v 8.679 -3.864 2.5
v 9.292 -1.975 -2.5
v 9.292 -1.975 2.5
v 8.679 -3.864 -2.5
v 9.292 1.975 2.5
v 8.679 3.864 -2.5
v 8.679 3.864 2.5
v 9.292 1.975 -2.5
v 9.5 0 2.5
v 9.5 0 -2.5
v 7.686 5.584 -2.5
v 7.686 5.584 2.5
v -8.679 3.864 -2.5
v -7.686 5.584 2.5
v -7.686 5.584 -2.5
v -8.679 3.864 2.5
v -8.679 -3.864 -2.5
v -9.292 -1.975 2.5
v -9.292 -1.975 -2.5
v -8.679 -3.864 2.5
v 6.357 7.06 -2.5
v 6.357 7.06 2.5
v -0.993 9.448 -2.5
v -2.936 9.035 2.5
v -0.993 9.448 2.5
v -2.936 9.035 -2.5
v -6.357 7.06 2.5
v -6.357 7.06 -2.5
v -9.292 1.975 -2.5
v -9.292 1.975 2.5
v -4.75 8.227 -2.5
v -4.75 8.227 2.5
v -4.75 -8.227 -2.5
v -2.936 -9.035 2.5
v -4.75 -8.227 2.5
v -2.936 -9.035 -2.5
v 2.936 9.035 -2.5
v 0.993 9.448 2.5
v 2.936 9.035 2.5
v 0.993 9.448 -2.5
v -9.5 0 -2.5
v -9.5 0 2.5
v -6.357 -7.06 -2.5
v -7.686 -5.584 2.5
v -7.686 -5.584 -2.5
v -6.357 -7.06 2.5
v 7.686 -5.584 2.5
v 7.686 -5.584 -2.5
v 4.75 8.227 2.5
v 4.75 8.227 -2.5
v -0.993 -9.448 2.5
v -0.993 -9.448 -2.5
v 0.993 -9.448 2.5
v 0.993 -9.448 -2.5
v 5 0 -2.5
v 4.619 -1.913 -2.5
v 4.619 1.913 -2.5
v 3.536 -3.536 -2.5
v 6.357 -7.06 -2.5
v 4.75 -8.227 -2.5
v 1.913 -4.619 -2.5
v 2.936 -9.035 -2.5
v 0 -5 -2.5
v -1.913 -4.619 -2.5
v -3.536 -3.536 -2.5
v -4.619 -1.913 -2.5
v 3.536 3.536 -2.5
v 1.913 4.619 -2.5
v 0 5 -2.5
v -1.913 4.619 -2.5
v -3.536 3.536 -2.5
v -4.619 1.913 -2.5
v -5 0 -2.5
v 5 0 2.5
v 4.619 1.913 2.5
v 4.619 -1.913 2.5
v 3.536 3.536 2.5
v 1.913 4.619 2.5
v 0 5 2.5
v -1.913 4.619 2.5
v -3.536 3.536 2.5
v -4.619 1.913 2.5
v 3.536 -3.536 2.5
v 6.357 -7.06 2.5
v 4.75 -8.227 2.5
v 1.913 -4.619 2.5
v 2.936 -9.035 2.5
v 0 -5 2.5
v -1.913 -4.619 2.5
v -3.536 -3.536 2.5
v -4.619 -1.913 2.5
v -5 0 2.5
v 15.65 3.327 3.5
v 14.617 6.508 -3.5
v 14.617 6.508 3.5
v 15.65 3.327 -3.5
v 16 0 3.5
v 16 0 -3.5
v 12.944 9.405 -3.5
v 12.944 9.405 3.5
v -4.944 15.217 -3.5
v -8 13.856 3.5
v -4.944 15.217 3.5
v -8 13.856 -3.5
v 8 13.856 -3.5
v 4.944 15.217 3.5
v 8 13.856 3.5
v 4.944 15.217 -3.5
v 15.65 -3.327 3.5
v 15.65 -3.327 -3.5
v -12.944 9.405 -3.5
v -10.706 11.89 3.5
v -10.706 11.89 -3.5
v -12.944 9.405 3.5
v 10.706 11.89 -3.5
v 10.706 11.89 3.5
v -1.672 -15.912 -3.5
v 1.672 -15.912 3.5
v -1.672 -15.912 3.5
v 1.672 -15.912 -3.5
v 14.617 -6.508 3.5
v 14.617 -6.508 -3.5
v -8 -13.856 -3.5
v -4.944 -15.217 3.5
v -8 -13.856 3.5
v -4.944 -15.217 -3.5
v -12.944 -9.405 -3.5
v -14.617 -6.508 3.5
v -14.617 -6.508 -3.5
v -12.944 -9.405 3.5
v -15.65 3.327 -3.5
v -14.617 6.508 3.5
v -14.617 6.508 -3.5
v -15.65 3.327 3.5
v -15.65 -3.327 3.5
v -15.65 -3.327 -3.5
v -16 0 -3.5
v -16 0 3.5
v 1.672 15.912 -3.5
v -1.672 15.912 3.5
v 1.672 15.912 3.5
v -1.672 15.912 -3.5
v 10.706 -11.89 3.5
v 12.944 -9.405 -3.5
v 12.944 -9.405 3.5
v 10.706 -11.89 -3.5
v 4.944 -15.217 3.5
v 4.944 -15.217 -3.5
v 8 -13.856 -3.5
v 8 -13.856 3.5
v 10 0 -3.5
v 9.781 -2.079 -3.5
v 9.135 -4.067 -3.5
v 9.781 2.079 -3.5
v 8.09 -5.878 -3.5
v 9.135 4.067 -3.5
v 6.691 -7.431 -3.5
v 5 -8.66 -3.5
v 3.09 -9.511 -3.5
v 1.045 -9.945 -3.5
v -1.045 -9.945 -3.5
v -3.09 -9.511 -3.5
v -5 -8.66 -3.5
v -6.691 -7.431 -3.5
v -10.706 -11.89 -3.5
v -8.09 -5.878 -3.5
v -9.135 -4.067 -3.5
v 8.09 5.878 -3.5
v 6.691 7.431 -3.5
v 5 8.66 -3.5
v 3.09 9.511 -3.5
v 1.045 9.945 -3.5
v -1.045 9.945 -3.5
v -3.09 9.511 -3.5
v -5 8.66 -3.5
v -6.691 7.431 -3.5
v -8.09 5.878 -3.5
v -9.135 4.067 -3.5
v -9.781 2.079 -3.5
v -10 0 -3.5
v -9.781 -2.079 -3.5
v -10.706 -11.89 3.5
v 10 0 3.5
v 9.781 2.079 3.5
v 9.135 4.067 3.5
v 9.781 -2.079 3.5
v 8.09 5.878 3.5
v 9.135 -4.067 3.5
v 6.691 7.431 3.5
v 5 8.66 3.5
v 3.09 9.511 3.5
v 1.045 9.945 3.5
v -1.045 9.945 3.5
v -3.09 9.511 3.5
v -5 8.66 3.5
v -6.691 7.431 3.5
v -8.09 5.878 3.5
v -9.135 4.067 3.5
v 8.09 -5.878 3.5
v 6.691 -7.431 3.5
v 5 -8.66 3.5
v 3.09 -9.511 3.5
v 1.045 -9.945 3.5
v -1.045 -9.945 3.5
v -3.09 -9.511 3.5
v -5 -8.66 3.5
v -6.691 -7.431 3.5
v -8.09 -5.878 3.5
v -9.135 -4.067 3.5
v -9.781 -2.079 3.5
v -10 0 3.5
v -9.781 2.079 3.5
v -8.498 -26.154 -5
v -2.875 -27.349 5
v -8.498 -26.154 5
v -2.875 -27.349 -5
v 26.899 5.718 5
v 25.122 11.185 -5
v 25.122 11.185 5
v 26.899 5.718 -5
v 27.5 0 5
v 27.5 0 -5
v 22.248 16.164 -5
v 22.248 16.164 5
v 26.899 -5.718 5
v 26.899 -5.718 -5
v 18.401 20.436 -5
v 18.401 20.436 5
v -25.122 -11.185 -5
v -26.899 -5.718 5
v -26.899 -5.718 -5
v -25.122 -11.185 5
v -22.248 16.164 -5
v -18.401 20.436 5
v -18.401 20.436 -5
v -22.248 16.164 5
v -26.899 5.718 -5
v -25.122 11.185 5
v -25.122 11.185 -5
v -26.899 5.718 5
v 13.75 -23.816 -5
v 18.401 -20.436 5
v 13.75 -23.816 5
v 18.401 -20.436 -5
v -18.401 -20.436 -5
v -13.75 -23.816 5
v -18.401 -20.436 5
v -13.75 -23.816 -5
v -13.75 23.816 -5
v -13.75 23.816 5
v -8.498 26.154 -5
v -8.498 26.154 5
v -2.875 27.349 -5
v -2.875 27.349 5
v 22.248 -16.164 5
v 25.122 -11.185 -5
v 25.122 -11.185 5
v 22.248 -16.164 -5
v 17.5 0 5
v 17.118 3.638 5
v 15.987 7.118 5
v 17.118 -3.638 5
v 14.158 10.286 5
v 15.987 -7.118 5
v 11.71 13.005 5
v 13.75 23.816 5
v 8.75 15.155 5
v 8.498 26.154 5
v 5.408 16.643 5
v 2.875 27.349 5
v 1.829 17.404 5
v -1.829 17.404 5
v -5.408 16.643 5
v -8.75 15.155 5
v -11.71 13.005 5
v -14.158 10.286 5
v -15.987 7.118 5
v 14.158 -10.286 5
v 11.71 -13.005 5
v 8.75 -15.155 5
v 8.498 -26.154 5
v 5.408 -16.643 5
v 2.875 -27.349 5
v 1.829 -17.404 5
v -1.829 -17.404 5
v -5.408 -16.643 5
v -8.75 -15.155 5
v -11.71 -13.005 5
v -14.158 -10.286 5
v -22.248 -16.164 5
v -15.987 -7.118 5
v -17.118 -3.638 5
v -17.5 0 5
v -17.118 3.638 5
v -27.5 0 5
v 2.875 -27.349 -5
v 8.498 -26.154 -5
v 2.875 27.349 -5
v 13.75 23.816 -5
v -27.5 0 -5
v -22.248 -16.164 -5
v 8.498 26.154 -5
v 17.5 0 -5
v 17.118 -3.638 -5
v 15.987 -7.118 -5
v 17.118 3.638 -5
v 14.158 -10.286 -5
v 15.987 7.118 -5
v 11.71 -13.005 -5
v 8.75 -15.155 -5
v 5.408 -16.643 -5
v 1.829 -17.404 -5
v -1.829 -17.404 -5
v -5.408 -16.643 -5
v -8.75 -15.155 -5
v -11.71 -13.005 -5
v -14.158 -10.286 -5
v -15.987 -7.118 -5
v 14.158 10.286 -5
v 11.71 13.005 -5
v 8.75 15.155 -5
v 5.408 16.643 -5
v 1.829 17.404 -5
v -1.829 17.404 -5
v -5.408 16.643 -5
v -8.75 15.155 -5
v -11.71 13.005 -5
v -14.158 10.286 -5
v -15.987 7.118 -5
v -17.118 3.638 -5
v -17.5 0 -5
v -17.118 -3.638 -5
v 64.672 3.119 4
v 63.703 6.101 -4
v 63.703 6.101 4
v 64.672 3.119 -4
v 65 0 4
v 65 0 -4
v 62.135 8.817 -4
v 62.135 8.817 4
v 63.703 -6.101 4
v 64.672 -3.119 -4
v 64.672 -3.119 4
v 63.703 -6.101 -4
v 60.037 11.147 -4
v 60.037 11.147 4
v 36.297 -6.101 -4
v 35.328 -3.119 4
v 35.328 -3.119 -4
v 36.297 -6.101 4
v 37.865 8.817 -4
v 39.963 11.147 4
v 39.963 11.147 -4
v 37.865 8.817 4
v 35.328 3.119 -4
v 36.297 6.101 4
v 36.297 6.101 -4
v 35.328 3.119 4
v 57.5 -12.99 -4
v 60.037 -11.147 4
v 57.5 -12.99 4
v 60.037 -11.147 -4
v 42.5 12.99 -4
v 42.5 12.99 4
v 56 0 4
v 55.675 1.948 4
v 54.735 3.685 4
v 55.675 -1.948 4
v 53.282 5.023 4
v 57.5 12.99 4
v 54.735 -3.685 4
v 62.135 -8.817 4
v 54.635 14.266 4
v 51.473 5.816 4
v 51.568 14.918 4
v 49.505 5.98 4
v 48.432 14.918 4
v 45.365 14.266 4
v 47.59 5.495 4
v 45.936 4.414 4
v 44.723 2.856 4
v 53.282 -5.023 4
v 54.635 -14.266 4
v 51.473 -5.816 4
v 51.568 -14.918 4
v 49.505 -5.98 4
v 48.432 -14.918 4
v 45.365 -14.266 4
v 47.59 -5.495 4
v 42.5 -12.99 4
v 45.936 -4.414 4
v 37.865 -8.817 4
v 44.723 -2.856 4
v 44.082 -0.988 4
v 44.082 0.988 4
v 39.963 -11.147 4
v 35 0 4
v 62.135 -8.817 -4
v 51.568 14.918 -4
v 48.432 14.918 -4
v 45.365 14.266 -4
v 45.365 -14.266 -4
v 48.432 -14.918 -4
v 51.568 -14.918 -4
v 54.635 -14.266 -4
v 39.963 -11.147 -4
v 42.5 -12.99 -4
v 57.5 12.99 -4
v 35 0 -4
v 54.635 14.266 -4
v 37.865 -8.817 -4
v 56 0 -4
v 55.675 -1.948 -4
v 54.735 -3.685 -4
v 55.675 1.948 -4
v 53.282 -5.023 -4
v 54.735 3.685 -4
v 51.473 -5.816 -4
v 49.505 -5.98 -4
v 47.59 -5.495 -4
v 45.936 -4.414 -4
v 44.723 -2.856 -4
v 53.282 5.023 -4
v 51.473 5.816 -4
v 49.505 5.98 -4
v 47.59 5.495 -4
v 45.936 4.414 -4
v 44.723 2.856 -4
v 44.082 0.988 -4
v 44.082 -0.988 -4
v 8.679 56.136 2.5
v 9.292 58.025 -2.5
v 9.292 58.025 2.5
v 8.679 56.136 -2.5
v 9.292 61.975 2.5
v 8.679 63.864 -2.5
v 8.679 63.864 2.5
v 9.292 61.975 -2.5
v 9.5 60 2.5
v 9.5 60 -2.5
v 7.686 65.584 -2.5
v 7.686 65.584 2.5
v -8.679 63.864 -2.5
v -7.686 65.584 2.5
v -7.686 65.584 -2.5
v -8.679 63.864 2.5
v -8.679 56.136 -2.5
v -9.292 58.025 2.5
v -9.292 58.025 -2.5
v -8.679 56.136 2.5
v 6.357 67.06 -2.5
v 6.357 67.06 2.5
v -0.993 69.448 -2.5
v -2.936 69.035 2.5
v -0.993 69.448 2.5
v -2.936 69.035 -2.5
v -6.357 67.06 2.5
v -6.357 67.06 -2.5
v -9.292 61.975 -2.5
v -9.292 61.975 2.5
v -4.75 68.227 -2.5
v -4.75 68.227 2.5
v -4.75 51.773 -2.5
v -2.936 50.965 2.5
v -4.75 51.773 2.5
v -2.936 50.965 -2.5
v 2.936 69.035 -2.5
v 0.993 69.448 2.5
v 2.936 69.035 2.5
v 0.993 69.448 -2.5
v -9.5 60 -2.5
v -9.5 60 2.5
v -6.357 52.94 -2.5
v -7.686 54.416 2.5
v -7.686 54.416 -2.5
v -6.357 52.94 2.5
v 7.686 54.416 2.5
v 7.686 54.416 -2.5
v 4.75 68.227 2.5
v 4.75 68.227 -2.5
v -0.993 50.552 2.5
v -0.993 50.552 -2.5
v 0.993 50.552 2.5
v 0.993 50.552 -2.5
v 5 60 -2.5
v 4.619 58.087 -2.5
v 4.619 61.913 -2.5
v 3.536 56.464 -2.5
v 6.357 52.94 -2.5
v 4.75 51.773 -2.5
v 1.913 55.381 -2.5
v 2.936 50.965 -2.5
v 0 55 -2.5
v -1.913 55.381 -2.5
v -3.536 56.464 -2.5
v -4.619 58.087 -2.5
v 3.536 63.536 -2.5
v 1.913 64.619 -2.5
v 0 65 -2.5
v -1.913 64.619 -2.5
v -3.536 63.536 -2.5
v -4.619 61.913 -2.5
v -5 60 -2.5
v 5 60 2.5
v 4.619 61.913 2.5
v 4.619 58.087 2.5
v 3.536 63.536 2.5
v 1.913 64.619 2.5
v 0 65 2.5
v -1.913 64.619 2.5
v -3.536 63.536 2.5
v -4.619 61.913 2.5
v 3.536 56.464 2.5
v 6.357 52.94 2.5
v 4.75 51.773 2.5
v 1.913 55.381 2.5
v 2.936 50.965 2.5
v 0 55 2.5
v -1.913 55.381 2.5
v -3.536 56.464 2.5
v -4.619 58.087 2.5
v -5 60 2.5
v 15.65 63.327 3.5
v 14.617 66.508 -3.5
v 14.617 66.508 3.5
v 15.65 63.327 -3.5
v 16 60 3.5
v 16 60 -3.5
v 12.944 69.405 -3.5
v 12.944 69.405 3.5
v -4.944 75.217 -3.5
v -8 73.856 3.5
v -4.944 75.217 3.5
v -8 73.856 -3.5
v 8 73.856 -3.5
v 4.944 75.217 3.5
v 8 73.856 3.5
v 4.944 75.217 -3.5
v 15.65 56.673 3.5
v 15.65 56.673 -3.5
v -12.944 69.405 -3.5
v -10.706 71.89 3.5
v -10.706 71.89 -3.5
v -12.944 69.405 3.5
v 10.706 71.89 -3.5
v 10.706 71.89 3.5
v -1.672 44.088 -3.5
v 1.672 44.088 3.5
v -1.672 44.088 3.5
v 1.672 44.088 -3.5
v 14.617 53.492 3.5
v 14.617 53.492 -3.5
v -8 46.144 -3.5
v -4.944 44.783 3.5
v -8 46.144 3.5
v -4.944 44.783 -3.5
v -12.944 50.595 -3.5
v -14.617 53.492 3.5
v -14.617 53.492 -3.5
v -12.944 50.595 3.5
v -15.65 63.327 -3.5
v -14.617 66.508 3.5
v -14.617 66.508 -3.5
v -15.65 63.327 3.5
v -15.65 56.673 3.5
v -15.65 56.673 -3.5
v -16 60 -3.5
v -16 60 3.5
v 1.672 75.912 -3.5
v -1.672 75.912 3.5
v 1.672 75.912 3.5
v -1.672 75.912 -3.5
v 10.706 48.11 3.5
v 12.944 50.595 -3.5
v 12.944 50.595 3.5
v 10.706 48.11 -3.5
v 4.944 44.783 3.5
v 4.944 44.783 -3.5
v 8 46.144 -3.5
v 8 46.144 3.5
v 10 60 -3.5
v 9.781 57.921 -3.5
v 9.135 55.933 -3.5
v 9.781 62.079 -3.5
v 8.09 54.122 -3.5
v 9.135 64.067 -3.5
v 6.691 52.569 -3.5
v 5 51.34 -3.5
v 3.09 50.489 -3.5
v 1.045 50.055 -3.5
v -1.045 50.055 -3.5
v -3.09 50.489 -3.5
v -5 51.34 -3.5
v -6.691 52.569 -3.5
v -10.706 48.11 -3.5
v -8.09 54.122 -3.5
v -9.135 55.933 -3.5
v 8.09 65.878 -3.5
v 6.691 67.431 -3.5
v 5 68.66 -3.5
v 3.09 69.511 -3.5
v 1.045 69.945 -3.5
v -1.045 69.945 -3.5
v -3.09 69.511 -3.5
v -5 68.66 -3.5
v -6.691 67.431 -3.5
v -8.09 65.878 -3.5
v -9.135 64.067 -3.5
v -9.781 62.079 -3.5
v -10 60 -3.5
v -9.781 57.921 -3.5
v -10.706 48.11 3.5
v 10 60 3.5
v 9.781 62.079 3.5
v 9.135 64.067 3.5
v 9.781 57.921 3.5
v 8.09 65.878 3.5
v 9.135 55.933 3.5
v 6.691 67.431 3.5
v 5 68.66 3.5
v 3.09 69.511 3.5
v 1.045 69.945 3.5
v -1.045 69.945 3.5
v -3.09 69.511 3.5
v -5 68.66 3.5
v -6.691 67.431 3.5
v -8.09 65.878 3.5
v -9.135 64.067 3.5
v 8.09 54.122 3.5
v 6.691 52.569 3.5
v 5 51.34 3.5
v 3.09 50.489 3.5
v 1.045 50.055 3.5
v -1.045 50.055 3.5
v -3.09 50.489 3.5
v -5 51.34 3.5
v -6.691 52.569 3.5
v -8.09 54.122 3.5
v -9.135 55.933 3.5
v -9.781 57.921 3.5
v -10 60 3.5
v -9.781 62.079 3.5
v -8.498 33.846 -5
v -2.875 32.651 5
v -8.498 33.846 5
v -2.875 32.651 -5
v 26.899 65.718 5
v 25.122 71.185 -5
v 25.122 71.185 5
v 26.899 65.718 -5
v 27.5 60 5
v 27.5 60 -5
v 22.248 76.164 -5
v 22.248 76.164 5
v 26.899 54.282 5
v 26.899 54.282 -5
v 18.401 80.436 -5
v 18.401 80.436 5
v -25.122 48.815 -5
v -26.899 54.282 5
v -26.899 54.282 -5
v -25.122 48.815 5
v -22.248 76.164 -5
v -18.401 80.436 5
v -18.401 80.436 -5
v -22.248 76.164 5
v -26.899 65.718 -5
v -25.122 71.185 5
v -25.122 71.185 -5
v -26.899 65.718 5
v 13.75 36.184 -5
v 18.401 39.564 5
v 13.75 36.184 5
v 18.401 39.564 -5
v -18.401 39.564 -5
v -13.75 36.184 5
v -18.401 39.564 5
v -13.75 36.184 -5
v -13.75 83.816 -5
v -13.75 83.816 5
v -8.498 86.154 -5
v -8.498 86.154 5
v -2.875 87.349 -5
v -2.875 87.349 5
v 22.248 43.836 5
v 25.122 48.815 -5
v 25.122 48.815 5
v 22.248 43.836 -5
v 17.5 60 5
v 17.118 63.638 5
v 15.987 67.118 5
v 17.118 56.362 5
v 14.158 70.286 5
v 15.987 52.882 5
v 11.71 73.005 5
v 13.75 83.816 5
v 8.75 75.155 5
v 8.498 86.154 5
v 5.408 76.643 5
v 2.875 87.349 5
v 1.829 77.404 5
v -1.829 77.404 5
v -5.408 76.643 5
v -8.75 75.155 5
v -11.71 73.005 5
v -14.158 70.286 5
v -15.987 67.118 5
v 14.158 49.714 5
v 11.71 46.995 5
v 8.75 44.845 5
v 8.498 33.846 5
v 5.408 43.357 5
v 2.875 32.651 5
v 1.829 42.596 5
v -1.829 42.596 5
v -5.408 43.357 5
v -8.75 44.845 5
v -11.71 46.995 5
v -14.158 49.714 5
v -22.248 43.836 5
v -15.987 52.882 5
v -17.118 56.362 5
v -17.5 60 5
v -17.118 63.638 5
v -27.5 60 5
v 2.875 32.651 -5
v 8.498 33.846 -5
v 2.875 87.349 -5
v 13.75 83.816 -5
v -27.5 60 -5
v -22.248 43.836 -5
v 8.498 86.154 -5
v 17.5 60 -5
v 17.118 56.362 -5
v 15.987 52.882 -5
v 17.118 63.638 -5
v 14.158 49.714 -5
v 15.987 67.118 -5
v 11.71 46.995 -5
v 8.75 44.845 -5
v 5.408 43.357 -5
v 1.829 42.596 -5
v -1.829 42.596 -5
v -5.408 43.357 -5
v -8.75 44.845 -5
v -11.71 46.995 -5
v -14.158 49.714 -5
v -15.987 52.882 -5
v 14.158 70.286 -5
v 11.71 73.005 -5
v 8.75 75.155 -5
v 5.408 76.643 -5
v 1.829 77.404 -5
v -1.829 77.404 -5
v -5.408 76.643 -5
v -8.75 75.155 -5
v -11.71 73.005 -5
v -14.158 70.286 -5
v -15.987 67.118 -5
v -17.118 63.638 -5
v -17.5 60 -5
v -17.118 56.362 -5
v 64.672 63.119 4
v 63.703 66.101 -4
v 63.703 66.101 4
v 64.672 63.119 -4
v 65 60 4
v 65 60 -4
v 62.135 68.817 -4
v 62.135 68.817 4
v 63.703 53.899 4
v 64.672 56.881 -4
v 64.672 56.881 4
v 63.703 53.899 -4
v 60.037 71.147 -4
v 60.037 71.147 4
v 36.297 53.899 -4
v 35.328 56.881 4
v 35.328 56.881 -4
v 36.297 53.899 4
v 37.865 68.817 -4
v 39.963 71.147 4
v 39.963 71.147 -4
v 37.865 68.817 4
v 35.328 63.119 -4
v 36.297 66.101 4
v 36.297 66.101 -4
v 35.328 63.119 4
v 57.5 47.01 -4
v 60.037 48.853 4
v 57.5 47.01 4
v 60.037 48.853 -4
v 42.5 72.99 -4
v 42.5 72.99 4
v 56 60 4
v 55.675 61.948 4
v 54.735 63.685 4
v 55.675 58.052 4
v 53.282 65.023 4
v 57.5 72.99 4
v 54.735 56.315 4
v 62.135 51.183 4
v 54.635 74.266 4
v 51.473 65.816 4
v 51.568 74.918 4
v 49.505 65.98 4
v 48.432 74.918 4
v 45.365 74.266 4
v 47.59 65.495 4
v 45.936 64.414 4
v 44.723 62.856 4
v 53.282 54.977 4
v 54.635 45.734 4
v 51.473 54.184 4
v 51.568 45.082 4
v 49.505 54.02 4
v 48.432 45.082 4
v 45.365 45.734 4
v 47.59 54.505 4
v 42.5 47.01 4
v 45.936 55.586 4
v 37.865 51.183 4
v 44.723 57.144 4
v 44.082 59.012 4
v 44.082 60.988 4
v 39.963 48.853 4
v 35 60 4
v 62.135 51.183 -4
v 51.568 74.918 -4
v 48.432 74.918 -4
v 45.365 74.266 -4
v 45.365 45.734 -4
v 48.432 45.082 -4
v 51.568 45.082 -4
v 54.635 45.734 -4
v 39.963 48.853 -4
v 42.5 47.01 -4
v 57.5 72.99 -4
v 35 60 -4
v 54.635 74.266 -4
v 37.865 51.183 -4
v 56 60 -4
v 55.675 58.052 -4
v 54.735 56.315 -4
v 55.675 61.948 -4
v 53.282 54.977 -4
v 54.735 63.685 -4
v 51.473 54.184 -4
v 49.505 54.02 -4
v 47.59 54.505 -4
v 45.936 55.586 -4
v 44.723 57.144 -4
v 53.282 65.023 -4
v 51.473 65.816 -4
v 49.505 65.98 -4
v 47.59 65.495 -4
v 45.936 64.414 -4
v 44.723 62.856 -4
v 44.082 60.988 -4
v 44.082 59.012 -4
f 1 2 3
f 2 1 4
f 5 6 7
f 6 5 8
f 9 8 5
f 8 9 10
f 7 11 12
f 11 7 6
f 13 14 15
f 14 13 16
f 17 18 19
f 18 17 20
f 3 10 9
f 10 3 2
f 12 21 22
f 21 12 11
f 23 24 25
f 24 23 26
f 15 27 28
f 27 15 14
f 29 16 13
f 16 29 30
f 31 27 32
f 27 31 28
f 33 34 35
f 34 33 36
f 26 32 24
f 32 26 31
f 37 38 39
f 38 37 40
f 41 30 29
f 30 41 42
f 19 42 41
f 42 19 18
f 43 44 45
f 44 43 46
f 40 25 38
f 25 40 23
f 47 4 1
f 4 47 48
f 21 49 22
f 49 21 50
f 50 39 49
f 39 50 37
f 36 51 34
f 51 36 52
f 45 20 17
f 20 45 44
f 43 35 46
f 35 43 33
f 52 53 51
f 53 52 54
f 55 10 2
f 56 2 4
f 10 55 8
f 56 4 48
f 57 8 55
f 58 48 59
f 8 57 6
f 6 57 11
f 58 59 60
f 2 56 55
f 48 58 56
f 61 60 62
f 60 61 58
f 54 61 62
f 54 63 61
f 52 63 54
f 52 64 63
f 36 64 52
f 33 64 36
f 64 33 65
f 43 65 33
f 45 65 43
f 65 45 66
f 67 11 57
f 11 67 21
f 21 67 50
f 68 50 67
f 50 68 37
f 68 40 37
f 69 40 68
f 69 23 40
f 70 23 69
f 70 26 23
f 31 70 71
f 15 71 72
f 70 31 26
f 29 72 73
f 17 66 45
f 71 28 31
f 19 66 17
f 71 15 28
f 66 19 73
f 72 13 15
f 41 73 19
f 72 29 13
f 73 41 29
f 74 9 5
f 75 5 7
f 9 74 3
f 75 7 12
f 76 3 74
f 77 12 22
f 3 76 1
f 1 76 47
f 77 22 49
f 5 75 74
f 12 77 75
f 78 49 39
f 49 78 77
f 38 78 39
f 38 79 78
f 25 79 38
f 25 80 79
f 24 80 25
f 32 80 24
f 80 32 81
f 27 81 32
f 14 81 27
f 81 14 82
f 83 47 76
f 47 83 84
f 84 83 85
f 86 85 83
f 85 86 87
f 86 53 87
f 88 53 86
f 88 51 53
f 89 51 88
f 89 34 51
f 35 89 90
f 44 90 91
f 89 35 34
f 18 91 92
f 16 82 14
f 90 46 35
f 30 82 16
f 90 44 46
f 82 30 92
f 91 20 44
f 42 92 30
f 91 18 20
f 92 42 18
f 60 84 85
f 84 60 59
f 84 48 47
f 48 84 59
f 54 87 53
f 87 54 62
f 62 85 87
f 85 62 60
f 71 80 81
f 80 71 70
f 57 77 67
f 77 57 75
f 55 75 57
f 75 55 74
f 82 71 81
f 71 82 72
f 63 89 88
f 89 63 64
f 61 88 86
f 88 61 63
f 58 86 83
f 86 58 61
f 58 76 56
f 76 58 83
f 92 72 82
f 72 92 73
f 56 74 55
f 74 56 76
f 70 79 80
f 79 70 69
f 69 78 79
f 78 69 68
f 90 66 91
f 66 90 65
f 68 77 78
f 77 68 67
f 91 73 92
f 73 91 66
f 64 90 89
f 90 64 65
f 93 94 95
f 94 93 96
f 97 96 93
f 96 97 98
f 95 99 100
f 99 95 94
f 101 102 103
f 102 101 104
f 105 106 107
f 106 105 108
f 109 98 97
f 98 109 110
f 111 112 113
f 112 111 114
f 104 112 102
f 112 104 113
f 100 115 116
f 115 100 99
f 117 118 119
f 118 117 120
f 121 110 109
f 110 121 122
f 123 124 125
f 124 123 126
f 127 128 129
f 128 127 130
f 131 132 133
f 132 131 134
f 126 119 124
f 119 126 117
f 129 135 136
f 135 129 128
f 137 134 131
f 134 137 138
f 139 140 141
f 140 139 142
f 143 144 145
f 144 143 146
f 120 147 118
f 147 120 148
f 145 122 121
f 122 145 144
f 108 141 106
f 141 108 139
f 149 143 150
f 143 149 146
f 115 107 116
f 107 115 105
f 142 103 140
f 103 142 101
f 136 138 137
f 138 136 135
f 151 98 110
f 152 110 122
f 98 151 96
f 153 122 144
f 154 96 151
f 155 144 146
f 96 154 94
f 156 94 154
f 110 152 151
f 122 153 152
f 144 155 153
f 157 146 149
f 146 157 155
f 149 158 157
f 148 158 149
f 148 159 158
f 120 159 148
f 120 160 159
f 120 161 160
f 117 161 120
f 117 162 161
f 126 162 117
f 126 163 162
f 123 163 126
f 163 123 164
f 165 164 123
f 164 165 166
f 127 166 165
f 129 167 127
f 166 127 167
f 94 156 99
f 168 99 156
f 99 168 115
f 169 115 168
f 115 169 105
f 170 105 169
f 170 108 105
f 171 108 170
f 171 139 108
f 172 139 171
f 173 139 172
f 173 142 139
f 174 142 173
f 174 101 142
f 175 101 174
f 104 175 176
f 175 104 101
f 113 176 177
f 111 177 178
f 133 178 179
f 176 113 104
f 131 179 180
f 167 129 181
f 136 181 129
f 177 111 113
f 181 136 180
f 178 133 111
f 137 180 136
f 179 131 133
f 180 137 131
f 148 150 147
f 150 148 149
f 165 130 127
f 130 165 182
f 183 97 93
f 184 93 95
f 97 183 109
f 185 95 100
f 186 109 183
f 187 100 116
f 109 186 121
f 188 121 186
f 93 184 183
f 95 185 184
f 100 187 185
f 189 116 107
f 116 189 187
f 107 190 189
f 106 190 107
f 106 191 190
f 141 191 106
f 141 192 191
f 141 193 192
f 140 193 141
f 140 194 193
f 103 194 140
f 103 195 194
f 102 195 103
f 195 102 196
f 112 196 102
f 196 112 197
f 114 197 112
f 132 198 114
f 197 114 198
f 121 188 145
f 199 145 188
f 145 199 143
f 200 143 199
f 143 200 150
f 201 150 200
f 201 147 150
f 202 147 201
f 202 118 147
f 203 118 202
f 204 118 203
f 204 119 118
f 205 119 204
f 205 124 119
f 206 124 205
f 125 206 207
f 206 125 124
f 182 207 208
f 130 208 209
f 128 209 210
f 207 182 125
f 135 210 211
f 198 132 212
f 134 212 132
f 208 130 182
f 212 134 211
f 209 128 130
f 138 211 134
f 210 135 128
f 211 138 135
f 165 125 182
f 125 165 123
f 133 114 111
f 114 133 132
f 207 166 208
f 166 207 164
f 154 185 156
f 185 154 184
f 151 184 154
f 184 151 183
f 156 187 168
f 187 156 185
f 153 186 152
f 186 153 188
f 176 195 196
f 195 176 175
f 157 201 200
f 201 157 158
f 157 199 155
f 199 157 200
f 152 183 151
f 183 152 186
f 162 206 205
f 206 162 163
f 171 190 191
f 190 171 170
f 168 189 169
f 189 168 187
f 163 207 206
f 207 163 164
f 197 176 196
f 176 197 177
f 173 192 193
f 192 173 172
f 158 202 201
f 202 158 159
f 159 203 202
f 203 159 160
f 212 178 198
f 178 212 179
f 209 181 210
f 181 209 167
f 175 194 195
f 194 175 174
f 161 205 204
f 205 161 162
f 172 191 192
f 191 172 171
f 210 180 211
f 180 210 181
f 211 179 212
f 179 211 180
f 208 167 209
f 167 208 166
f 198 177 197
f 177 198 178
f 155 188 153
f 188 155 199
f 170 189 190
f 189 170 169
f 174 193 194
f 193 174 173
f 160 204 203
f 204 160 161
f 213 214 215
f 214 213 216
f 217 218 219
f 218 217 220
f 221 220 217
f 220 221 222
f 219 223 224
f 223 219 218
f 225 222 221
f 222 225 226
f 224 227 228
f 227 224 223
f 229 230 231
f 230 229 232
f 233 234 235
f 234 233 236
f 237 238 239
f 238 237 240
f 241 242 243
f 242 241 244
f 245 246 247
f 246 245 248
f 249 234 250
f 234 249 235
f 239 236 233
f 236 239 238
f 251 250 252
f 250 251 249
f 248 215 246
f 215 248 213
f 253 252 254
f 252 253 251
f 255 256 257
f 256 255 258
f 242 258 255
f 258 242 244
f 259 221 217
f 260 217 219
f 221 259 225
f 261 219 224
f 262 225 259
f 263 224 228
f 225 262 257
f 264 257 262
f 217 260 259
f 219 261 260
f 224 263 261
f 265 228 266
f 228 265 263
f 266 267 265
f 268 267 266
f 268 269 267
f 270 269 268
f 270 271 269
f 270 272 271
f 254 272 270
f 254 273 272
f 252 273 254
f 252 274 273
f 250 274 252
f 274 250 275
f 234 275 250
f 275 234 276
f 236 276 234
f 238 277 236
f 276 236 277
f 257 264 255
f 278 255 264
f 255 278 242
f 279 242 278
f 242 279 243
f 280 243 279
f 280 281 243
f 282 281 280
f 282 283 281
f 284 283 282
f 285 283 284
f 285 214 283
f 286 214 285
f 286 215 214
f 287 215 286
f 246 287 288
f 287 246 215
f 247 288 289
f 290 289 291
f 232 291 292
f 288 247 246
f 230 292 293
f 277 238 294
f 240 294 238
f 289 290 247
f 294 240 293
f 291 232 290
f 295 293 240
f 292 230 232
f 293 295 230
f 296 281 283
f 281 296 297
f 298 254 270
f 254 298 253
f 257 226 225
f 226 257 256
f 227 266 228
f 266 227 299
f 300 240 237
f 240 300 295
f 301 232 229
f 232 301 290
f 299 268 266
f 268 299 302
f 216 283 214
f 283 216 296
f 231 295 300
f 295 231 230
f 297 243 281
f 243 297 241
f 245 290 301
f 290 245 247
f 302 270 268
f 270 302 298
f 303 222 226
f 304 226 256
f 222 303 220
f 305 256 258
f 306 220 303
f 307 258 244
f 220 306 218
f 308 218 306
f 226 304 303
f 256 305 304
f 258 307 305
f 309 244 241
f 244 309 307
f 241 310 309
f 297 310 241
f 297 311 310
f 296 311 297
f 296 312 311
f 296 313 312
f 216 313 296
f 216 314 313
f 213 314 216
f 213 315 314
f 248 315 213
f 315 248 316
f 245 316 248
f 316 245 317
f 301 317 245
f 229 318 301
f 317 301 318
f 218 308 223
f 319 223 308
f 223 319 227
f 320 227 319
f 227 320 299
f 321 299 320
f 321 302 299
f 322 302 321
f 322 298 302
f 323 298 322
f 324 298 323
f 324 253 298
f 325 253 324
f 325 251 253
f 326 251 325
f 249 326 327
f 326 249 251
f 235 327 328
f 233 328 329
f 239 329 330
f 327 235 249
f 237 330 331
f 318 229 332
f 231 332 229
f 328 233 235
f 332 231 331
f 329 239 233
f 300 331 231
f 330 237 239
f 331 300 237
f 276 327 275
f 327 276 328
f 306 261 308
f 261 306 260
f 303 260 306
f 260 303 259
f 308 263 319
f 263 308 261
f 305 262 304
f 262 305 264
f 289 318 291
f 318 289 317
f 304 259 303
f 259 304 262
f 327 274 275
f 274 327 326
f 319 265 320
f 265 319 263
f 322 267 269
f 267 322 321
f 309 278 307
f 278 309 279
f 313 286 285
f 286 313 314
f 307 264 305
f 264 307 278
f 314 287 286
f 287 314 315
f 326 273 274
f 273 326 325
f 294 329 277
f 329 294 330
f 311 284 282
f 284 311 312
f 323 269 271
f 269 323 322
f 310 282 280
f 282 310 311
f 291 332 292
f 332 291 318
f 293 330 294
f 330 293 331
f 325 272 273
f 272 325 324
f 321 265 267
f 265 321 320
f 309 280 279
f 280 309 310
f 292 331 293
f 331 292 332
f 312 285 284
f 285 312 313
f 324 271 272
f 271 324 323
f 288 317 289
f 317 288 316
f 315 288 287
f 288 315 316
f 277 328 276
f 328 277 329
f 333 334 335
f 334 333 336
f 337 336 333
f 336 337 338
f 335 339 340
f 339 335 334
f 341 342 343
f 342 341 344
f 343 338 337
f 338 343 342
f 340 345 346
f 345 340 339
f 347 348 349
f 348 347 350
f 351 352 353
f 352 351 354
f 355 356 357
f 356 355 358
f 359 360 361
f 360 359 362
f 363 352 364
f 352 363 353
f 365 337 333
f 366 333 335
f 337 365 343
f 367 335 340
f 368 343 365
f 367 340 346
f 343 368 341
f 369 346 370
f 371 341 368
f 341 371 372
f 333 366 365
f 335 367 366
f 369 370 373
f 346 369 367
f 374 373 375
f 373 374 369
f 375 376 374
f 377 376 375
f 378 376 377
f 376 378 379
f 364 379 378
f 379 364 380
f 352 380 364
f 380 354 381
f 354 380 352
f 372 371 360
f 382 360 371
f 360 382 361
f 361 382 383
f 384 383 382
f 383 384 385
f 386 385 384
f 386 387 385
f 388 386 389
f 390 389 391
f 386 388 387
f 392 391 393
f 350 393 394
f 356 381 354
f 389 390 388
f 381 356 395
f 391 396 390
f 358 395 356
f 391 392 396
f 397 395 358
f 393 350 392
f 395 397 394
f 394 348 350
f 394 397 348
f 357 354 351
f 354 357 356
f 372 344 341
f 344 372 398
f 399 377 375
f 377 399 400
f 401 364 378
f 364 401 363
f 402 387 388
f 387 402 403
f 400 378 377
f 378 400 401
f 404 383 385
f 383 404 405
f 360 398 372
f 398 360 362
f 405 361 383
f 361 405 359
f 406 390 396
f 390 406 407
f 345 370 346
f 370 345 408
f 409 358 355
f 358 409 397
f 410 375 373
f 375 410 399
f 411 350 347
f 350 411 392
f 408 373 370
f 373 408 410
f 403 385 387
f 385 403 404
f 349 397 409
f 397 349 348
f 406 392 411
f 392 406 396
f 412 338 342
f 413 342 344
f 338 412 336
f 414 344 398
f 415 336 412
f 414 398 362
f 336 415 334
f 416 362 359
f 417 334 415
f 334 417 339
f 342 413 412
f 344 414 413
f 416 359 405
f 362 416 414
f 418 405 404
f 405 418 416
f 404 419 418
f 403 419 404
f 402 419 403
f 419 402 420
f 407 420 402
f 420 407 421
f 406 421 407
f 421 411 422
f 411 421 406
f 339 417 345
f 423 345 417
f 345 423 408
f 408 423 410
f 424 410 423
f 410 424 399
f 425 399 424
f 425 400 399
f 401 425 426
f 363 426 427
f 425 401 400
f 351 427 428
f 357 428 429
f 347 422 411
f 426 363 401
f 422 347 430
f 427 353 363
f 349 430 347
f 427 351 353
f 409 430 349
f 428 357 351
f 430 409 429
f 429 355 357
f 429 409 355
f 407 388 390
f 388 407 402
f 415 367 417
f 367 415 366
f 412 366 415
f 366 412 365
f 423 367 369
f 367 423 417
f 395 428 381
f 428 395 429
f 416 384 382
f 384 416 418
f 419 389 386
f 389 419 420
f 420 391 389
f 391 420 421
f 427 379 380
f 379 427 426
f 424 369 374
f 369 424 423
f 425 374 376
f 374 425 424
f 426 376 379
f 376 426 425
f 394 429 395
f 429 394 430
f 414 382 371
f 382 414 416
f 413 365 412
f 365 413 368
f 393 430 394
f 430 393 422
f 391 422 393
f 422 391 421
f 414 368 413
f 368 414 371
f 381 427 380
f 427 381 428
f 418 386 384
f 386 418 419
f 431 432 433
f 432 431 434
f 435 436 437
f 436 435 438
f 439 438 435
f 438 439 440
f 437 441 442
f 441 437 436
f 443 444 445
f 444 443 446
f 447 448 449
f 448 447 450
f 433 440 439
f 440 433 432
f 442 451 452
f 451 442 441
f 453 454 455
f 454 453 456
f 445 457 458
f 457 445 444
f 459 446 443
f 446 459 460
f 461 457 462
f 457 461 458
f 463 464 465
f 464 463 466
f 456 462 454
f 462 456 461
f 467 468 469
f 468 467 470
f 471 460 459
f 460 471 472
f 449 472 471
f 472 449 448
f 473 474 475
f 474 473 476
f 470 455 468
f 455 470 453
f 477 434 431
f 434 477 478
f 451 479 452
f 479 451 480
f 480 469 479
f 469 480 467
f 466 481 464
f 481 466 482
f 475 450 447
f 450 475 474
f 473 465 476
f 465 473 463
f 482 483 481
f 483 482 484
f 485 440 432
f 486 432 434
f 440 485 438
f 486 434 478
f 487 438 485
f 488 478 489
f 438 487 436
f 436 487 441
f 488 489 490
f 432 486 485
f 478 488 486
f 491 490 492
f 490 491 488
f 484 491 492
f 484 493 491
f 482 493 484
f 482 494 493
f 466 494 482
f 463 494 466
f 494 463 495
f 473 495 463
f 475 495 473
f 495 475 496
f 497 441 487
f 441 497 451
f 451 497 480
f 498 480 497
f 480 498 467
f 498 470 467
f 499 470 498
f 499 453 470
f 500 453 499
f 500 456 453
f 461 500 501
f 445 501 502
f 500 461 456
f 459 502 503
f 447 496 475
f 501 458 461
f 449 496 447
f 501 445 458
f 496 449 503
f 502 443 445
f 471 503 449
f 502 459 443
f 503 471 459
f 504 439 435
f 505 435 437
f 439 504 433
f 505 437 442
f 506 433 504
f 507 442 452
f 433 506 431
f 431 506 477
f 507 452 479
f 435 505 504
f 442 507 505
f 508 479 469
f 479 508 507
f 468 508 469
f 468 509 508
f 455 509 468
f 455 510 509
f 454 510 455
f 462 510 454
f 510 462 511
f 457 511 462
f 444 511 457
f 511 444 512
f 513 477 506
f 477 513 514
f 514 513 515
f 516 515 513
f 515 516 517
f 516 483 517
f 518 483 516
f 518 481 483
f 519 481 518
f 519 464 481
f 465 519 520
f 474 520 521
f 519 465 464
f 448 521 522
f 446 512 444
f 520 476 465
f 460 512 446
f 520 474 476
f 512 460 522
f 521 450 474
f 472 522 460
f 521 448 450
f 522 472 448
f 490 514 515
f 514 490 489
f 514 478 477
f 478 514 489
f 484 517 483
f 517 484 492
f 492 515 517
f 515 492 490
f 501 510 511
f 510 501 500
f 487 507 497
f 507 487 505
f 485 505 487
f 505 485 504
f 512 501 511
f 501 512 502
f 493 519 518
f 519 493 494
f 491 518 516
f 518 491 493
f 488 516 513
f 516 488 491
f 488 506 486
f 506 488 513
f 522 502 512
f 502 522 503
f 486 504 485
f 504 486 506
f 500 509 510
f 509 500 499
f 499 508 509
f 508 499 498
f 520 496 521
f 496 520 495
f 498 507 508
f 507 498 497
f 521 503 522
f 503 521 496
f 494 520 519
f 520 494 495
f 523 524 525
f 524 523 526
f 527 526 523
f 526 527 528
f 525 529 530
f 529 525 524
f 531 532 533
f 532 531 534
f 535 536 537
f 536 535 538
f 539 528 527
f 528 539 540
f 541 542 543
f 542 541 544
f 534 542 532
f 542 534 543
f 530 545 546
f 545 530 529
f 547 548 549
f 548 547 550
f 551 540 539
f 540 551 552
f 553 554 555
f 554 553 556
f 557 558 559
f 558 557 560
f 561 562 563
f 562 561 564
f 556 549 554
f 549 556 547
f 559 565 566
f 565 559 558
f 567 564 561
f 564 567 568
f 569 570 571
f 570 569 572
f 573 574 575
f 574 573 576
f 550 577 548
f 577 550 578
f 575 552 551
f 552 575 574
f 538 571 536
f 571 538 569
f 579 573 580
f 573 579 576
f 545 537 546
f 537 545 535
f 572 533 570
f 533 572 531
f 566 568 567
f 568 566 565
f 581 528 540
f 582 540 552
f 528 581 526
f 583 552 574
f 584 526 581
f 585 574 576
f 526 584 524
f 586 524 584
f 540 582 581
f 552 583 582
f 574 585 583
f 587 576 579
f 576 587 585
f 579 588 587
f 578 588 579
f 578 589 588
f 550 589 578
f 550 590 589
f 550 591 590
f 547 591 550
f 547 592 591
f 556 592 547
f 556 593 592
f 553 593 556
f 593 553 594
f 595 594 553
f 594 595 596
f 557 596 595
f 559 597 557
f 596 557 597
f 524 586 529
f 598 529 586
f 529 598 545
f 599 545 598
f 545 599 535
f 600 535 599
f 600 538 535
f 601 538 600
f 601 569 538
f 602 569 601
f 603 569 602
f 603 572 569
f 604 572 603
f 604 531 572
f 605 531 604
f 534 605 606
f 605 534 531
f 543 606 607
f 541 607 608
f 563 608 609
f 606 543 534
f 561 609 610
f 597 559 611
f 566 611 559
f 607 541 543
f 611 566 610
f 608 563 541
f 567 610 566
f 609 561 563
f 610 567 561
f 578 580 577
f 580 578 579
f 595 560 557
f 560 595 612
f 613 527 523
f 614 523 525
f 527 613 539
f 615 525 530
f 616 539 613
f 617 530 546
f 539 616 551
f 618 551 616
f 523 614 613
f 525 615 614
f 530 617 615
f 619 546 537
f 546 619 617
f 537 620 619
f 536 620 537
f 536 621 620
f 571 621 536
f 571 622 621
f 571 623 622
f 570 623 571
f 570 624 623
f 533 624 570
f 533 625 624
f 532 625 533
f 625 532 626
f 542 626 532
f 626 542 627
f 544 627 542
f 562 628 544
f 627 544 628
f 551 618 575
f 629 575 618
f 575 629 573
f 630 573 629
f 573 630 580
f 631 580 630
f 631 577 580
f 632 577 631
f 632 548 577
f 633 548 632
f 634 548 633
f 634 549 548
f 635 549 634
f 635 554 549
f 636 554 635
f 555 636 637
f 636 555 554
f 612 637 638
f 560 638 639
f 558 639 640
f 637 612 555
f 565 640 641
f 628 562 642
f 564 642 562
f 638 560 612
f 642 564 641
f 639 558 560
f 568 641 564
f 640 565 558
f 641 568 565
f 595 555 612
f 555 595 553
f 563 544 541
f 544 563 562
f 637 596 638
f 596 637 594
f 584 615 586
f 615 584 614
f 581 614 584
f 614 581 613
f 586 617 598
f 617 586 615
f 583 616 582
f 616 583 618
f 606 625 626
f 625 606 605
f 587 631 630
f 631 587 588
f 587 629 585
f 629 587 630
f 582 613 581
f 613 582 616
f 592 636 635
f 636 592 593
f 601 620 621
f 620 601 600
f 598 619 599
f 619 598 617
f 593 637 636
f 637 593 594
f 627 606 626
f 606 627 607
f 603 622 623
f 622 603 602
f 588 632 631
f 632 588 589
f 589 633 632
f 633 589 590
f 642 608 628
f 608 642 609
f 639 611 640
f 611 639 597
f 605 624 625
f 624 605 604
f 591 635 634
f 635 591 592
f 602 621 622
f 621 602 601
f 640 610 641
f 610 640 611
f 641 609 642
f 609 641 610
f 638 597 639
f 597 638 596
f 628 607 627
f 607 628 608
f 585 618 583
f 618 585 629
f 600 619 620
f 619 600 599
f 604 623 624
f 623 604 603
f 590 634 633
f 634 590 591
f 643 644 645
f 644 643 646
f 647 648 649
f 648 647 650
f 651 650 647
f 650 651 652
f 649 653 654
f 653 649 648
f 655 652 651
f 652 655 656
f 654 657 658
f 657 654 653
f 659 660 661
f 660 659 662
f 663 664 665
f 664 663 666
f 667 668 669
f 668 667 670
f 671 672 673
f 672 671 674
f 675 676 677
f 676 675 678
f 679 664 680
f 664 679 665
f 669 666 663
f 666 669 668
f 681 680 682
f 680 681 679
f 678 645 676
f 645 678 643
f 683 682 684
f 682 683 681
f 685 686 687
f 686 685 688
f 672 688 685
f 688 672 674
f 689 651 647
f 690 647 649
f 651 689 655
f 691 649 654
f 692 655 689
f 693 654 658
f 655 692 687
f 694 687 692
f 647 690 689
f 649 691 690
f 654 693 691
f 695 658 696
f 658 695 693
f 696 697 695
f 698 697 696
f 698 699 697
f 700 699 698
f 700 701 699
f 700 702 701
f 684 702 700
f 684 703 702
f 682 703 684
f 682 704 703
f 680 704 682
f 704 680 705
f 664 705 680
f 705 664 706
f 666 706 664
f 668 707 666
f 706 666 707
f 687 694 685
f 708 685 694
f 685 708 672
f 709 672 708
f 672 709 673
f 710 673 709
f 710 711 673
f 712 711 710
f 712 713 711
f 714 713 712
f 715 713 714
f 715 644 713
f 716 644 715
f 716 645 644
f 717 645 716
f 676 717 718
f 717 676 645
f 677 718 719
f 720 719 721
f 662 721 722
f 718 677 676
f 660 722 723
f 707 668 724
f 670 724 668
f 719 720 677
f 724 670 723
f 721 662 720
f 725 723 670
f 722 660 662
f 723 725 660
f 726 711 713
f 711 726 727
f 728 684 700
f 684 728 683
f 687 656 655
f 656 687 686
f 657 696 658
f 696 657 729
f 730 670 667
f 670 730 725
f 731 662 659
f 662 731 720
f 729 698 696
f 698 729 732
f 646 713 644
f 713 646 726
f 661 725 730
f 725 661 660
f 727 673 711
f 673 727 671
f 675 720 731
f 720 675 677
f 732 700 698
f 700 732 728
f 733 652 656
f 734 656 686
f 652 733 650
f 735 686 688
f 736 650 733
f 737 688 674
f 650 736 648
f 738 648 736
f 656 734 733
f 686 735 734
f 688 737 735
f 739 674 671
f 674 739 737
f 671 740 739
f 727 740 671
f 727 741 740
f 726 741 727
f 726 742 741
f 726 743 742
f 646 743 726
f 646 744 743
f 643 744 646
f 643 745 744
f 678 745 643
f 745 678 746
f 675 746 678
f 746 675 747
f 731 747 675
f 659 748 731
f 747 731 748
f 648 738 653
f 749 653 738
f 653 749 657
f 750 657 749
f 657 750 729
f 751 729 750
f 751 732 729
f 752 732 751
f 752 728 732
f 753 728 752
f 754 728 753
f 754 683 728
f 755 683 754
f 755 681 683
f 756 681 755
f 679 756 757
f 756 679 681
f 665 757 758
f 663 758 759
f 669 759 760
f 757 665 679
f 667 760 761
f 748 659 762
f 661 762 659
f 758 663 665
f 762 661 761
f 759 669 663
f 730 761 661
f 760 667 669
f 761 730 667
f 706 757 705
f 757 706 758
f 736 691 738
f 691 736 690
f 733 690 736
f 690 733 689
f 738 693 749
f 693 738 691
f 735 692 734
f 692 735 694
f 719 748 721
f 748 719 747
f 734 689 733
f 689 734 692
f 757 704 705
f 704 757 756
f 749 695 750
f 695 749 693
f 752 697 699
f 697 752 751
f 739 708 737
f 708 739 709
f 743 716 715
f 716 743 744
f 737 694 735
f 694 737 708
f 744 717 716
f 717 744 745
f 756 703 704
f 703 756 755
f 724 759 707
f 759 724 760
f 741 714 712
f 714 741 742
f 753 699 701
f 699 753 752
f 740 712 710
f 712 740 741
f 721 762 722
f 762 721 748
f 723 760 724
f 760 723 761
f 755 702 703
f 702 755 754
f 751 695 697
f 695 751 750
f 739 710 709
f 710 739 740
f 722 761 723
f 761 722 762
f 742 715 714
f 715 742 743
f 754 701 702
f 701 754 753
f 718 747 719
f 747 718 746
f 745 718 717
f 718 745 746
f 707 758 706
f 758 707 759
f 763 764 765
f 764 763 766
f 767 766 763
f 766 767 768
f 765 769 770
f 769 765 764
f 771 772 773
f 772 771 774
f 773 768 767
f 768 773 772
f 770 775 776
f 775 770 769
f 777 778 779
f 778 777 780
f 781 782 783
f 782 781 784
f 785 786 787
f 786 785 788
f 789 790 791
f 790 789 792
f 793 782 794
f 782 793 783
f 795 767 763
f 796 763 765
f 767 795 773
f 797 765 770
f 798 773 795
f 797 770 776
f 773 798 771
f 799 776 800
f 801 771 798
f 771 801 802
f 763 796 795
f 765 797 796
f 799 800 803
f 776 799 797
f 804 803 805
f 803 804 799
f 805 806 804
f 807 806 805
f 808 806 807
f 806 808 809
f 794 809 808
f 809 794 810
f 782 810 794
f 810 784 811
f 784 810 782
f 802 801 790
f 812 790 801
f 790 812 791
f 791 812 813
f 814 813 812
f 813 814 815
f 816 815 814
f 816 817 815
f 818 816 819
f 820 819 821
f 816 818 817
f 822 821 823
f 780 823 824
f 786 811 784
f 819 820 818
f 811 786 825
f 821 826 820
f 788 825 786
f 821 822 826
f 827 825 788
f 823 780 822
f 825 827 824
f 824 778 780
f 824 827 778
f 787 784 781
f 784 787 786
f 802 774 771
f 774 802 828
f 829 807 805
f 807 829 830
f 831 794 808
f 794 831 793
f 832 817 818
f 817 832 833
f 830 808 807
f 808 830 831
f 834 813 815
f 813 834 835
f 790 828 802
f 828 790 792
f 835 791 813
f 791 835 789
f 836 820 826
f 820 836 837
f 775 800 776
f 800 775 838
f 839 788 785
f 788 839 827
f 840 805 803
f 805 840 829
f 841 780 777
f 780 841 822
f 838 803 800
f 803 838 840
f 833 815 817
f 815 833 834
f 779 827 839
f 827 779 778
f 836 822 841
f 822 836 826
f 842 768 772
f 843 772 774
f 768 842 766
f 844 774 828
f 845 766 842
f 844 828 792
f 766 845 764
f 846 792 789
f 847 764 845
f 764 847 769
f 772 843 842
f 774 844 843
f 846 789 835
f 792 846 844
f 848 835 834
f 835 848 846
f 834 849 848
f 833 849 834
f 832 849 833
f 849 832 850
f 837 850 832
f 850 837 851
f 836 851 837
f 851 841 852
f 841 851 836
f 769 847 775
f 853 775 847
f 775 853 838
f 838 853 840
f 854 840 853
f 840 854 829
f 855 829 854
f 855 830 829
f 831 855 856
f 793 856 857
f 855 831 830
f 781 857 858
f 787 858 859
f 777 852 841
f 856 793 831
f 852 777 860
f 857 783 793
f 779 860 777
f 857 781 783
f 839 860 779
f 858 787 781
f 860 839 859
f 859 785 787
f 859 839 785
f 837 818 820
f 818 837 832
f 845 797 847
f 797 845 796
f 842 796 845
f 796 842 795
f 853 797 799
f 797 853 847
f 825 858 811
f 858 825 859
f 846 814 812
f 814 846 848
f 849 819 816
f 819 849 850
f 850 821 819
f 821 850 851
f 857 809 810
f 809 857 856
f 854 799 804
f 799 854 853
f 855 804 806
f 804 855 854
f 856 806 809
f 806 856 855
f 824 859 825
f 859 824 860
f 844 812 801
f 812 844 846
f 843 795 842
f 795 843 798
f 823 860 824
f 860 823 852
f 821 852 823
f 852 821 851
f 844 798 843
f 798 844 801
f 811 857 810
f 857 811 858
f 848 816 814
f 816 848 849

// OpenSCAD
$useMcMaster = true;
module bearing(id, od, wd, mcmaster, series, labels=false){
    echo(str("Creating a ", series, " bearing with id=", id, "mm od=", od, "mm width=", wd, "mm ..."));
    difference(){
        color("grey")cylinder(d=od,h=wd, center=true);
        color("white")cylinder(d=id,h=wd+1, center=true);  
        if($preview && labels){
            bearing_lettering(id, od, wd, mcmaster, series);    
        }
    }
}

module bearing_lettering(id, od, wd, mcmaster, series)
{
    degreesSeries = 25*len(series);
    degreesMcMaster = 25*len(mcmaster);
    color("black")
    rotate(180+45){
        rotate(degreesSeries)
        bearing_text(id,od, wd, series,degreesSeries);
        if($useMcMaster){
            rotate(degreesMcMaster+degreesSeries+10)
            bearing_text(id,od, wd, mcmaster, degreesMcMaster);   
        }
    }
}

module bearing_text(id, od, wd, st, radiusConsumed=180){
    bearingGirth = (od-id)/2;
    letterHeight = bearingGirth * 0.6;
    letterOffsetFromCenter = (od/2) - (bearingGirth*0.9);
    
    width=bearingGirth ;
    thickness=wd/20 ;
    chars=len(st)+1 ;
    //echo(str("Writing ", st, " at " , letterOffsetFromCenter, "mm from center"));
    for (i = [1:chars]) {
            rotate([0,0,90-(i*(radiusConsumed/chars))])
            translate([0,letterOffsetFromCenter,(bearingGirth/2)-((thickness+1)/2)])
            linear_extrude(thickness+1)
            text(st[i-1],size=letterHeight, halign="center");
    }
}


module bearing_608(labels=true){ bearing(8,22,7,"5972K91","608", labels=labels); }
module bearing_626(labels=true){ bearing(6,19,6,"6661K11","626", labels=labels); }
module bearing_629(labels=true){ bearing(9,26,8,"5972K93","629", labels=labels); }
module bearing_635(labels=true){ bearing(5,19,6,"5972K197","635", labels=labels); }
module bearing_6000(labels=true){ bearing(10,26,8,"5972K94","6000", labels=labels); }
module bearing_6001(labels=true){ bearing(12,28,8,"5972K95","6001", labels=labels); }
module bearing_6002(labels=true){ bearing(15,32,9,"5972K358","6002", labels=labels); }
module bearing_6003(labels=true){ bearing(17,35,10,"5972K311","6003", labels=labels); }
module bearing_6007(labels=true){ bearing(35,62,14,"5972K312","6007", labels=labels); }
module bearing_6200(labels=true){ bearing(10,30,9,"5972K101","6200", labels=labels); }
module bearing_6201(labels=true){ bearing(12,32,10,"5972K313","6201", labels=labels); }
module bearing_6202(labels=true){ bearing(15,35,11,"5972K314","6202", labels=labels); }
module bearing_6203(labels=true){ bearing(17,40,12,"5972K104","6203", labels=labels); }
module bearing_6204(labels=true){ bearing(20,47,14,"5972K105","6204", labels=labels); }
module bearing_6205(labels=true){ bearing(25,52,15,"5972K315","6205", labels=labels); }
module bearing_6206(labels=true){ bearing(30,62,16,"5972K316","6206", labels=labels); }
module bearing_6207(labels=true){ bearing(35,72,17,"5972K317","6207", labels=labels); }
module bearing_6208(labels=true){ bearing(40,80,18,"5972K114","6208", labels=labels); }
module bearing_6209(labels=true){ bearing(45,85,19,"5972K115","6209", labels=labels); }
module bearing_6210(labels=true){ bearing(50,90,20,"5972K129","6210", labels=labels); }
module bearing_6211(labels=true){ bearing(55,100,21,"5972K113","6211", labels=labels); }
module bearing_6212(labels=true){ bearing(60,110,22,"5972K3","6212", labels=labels); }
module bearing_6301(labels=true){ bearing(12,37,12,"5972K318","6301", labels=labels); }
module bearing_6302(labels=true){ bearing(15,42,13,"5972K117","6302", labels=labels); }
module bearing_6303(labels=true){ bearing(17,47,14,"5972K118","6303", labels=labels); }
module bearing_6304(labels=true){ bearing(20,52,15,"5972K119","6304", labels=labels); }
module bearing_6305(labels=true){ bearing(25,62,17,"5972K121","6305", labels=labels); }
module bearing_6306(labels=true){ bearing(30,72,19,"5972K319","6306", labels=labels); }
module bearing_6307(labels=true){ bearing(35,80,21,"5972K503","6307", labels=labels); }
module bearing_6308(labels=true){ bearing(40,90,23,"5972K124","6308", labels=labels); }
module bearing_6309(labels=true){ bearing(45,100,25,"5972K125","6309", labels=labels); }
module bearing_6310(labels=true){ bearing(50,110,27,"5972K126","6310", labels=labels); }
module bearing_6311(labels=true){ bearing(55,120,29,"5972K127","6311", labels=labels); }
module bearing_6312(labels=true){ bearing(60,130,31,"5972K128","6312", labels=labels); }
module bearing_6403(labels=true){ bearing(17,62,17,"5972K198","6403", labels=labels); }
module bearing_6800(labels=true){ bearing(10,19,5,"5972K211","6800", labels=labels); }
module bearing_6801(labels=true){ bearing(12,21,5,"5972K212","6801", labels=labels); }
module bearing_6802(labels=true){ bearing(15,24,5,"5972K213","6802", labels=labels); }
module bearing_6803(labels=true){ bearing(17,26,5,"5972K214","6803", labels=labels); }
module bearing_6804(labels=true){ bearing(20,32,7,"5972K215","6804", labels=labels); }
module bearing_6805(labels=true){ bearing(25,37,7,"5972K216","6805", labels=labels); }
module bearing_6806(labels=true){ bearing(30,42,7,"5972K217","6806", labels=labels); }
module bearing_6900(labels=true){ bearing(10,22,6,"5972K241","6900", labels=labels); }
module bearing_6901(labels=true){ bearing(12,24,6,"5972K242","6901", labels=labels); }
module bearing_6902(labels=true){ bearing(15,28,7,"5972K243","6902", labels=labels); }
module bearing_6903(labels=true){ bearing(17,30,7,"5972K244","6903", labels=labels); }
module bearing_6904(labels=true){ bearing(20,37,9,"5972K245","6904", labels=labels); }
module bearing_6905(labels=true){ bearing(25,42,9,"5972K246","6905", labels=labels); }
module bearing_6906(labels=true){ bearing(30,47,9,"5972K247","6906", labels=labels); }
module bearing_6907(labels=true){ bearing(35,55,10,"5972K248","6907", labels=labels); }
module bearing_6908(labels=true){ bearing(40,62,12,"5972K249","6908", labels=labels); }
module bearing_16002(labels=true){ bearing(15,32,8,"5972K199","16002", labels=labels); }
module bearing_16004(labels=true){ bearing(20,42,8,"5972K218","16004", labels=labels); }
module bearing_16005(labels=true){ bearing(25,47,8,"5972K219","16005", labels=labels); }
module bearing_16100(labels=true){ bearing(10,28,8,"5972K223","16100", labels=labels); }
module bearing_16101(labels=true){ bearing(12,30,8,"5972K224","16101", labels=labels); }

translate([0,0,0])
{   
    bearing_6800();
    bearing_6804();
    bearing_6907();
    translate([50,0,0])
    bearing_16101();
}


translate([0,60,0])
{   
    bearing_6800(labels=false);
    bearing_6804(labels=false);
    bearing_6907(labels=false);
    translate([50,0,0])
    bearing_16101(labels=false);
}
